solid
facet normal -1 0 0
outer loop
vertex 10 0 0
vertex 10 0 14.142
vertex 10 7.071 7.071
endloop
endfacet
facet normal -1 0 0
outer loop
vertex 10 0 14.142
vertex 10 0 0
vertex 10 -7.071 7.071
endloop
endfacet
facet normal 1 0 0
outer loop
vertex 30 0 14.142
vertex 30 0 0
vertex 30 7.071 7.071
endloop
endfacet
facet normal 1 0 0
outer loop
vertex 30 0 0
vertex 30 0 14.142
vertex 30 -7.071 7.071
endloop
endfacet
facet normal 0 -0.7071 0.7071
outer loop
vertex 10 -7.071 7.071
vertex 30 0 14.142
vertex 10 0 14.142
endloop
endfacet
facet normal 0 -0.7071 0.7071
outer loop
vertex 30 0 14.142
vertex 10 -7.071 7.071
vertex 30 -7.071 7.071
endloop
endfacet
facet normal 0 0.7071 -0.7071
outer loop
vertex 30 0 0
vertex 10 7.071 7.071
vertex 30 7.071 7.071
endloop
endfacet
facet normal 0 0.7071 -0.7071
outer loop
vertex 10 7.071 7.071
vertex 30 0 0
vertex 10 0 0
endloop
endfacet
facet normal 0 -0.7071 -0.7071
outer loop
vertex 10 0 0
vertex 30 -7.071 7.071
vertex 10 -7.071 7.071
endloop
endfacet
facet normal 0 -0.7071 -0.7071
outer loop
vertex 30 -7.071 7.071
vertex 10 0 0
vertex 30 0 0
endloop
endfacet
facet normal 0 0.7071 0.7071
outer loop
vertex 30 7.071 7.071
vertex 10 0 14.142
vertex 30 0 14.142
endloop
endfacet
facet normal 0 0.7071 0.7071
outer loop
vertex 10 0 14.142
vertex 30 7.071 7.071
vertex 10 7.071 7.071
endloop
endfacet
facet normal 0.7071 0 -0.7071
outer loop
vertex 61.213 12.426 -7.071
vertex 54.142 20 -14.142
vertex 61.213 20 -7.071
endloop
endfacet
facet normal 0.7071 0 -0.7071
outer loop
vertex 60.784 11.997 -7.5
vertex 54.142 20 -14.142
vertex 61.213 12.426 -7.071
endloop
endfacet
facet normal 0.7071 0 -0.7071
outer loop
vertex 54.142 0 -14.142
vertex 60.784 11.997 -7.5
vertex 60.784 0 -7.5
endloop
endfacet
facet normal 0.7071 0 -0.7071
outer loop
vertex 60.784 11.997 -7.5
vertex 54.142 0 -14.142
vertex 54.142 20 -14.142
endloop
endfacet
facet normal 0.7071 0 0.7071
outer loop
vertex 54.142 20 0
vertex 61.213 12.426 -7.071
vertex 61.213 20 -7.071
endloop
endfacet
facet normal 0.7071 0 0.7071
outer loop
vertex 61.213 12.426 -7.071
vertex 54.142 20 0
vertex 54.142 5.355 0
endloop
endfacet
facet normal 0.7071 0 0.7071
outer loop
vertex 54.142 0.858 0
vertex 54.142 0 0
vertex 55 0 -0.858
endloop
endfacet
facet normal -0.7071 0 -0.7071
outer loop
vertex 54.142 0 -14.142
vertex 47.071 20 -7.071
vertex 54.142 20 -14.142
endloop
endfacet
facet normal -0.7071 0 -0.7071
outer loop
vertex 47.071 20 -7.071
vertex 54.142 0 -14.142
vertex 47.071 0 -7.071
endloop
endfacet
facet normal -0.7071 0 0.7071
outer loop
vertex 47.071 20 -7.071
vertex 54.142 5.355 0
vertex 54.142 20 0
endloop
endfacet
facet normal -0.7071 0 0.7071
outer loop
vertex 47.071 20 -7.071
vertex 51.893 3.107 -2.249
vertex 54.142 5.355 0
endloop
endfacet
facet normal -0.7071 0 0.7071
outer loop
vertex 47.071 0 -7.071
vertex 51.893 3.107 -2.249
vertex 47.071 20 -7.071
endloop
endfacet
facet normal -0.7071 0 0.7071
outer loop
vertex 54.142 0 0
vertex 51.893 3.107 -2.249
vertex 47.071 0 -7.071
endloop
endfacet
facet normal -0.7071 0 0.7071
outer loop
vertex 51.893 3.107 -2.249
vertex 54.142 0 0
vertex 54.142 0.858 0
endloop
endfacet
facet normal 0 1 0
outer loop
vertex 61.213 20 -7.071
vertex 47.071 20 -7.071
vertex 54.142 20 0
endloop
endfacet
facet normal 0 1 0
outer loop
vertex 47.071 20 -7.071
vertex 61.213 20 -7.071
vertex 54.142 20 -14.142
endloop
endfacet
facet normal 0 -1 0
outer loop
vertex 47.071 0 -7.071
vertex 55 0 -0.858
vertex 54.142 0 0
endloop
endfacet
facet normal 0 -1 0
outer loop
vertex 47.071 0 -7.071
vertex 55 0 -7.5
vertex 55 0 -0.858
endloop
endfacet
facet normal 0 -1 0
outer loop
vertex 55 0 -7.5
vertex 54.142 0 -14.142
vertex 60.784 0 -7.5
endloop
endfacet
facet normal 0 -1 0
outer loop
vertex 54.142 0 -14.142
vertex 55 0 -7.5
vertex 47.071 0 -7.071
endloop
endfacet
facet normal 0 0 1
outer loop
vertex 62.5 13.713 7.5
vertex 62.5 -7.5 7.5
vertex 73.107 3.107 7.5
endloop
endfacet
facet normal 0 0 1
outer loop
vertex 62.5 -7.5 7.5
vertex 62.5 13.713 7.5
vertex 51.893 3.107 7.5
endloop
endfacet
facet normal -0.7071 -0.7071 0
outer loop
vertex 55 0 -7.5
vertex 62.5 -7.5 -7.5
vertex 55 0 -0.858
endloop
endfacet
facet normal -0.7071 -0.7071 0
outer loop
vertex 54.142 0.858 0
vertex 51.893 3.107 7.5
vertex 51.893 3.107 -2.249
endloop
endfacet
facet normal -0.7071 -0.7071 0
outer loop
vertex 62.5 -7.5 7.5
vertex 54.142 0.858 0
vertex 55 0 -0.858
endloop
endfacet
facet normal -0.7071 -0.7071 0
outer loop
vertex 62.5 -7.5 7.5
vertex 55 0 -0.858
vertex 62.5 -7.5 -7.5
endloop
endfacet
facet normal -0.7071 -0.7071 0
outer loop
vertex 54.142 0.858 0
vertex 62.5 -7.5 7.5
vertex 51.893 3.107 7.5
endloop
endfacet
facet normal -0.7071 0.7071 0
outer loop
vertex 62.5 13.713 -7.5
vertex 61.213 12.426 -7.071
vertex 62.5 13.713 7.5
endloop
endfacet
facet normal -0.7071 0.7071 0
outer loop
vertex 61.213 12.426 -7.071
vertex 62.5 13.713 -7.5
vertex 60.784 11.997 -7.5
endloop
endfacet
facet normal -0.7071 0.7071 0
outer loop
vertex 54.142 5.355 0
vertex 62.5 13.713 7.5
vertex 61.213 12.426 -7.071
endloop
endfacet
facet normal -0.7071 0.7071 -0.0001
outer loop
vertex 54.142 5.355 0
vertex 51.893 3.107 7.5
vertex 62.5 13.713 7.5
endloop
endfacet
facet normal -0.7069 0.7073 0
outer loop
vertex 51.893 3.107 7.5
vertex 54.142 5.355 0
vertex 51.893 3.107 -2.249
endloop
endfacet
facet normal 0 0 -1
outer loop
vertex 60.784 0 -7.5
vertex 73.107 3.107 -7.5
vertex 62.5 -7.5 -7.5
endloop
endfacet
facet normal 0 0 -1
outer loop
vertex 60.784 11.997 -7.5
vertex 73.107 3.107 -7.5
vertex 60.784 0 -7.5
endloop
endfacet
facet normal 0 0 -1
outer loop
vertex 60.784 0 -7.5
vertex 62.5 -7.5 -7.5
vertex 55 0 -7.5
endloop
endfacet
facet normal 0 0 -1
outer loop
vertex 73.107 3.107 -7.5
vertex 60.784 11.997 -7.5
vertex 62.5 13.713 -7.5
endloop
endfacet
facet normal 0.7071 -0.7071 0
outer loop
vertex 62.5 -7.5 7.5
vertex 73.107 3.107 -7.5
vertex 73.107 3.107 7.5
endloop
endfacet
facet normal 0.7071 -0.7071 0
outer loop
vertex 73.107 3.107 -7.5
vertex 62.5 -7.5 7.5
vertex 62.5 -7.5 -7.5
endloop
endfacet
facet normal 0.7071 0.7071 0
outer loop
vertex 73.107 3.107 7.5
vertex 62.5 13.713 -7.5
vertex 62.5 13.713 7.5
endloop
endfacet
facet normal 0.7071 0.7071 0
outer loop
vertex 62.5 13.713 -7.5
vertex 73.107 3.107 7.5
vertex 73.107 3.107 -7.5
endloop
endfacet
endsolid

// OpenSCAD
// Combined transformation tests
union() {
    translate([10, 0, 0]) rotate([45, 0, 0]) scale([2, 1, 1]) cube([10, 10, 10]);
    translate([40, 0, 0]) rotate([0, 45, 0]) translate([10, 0, 0]) scale([1, 2, 1]) cube([10, 10, 10]);
    translate([70, 0, 0]) scale([1.5, 1.5, 1.5]) translate([-5, -5, -5]) rotate([0, 0, 45]) cube([10, 10, 10]);
}
